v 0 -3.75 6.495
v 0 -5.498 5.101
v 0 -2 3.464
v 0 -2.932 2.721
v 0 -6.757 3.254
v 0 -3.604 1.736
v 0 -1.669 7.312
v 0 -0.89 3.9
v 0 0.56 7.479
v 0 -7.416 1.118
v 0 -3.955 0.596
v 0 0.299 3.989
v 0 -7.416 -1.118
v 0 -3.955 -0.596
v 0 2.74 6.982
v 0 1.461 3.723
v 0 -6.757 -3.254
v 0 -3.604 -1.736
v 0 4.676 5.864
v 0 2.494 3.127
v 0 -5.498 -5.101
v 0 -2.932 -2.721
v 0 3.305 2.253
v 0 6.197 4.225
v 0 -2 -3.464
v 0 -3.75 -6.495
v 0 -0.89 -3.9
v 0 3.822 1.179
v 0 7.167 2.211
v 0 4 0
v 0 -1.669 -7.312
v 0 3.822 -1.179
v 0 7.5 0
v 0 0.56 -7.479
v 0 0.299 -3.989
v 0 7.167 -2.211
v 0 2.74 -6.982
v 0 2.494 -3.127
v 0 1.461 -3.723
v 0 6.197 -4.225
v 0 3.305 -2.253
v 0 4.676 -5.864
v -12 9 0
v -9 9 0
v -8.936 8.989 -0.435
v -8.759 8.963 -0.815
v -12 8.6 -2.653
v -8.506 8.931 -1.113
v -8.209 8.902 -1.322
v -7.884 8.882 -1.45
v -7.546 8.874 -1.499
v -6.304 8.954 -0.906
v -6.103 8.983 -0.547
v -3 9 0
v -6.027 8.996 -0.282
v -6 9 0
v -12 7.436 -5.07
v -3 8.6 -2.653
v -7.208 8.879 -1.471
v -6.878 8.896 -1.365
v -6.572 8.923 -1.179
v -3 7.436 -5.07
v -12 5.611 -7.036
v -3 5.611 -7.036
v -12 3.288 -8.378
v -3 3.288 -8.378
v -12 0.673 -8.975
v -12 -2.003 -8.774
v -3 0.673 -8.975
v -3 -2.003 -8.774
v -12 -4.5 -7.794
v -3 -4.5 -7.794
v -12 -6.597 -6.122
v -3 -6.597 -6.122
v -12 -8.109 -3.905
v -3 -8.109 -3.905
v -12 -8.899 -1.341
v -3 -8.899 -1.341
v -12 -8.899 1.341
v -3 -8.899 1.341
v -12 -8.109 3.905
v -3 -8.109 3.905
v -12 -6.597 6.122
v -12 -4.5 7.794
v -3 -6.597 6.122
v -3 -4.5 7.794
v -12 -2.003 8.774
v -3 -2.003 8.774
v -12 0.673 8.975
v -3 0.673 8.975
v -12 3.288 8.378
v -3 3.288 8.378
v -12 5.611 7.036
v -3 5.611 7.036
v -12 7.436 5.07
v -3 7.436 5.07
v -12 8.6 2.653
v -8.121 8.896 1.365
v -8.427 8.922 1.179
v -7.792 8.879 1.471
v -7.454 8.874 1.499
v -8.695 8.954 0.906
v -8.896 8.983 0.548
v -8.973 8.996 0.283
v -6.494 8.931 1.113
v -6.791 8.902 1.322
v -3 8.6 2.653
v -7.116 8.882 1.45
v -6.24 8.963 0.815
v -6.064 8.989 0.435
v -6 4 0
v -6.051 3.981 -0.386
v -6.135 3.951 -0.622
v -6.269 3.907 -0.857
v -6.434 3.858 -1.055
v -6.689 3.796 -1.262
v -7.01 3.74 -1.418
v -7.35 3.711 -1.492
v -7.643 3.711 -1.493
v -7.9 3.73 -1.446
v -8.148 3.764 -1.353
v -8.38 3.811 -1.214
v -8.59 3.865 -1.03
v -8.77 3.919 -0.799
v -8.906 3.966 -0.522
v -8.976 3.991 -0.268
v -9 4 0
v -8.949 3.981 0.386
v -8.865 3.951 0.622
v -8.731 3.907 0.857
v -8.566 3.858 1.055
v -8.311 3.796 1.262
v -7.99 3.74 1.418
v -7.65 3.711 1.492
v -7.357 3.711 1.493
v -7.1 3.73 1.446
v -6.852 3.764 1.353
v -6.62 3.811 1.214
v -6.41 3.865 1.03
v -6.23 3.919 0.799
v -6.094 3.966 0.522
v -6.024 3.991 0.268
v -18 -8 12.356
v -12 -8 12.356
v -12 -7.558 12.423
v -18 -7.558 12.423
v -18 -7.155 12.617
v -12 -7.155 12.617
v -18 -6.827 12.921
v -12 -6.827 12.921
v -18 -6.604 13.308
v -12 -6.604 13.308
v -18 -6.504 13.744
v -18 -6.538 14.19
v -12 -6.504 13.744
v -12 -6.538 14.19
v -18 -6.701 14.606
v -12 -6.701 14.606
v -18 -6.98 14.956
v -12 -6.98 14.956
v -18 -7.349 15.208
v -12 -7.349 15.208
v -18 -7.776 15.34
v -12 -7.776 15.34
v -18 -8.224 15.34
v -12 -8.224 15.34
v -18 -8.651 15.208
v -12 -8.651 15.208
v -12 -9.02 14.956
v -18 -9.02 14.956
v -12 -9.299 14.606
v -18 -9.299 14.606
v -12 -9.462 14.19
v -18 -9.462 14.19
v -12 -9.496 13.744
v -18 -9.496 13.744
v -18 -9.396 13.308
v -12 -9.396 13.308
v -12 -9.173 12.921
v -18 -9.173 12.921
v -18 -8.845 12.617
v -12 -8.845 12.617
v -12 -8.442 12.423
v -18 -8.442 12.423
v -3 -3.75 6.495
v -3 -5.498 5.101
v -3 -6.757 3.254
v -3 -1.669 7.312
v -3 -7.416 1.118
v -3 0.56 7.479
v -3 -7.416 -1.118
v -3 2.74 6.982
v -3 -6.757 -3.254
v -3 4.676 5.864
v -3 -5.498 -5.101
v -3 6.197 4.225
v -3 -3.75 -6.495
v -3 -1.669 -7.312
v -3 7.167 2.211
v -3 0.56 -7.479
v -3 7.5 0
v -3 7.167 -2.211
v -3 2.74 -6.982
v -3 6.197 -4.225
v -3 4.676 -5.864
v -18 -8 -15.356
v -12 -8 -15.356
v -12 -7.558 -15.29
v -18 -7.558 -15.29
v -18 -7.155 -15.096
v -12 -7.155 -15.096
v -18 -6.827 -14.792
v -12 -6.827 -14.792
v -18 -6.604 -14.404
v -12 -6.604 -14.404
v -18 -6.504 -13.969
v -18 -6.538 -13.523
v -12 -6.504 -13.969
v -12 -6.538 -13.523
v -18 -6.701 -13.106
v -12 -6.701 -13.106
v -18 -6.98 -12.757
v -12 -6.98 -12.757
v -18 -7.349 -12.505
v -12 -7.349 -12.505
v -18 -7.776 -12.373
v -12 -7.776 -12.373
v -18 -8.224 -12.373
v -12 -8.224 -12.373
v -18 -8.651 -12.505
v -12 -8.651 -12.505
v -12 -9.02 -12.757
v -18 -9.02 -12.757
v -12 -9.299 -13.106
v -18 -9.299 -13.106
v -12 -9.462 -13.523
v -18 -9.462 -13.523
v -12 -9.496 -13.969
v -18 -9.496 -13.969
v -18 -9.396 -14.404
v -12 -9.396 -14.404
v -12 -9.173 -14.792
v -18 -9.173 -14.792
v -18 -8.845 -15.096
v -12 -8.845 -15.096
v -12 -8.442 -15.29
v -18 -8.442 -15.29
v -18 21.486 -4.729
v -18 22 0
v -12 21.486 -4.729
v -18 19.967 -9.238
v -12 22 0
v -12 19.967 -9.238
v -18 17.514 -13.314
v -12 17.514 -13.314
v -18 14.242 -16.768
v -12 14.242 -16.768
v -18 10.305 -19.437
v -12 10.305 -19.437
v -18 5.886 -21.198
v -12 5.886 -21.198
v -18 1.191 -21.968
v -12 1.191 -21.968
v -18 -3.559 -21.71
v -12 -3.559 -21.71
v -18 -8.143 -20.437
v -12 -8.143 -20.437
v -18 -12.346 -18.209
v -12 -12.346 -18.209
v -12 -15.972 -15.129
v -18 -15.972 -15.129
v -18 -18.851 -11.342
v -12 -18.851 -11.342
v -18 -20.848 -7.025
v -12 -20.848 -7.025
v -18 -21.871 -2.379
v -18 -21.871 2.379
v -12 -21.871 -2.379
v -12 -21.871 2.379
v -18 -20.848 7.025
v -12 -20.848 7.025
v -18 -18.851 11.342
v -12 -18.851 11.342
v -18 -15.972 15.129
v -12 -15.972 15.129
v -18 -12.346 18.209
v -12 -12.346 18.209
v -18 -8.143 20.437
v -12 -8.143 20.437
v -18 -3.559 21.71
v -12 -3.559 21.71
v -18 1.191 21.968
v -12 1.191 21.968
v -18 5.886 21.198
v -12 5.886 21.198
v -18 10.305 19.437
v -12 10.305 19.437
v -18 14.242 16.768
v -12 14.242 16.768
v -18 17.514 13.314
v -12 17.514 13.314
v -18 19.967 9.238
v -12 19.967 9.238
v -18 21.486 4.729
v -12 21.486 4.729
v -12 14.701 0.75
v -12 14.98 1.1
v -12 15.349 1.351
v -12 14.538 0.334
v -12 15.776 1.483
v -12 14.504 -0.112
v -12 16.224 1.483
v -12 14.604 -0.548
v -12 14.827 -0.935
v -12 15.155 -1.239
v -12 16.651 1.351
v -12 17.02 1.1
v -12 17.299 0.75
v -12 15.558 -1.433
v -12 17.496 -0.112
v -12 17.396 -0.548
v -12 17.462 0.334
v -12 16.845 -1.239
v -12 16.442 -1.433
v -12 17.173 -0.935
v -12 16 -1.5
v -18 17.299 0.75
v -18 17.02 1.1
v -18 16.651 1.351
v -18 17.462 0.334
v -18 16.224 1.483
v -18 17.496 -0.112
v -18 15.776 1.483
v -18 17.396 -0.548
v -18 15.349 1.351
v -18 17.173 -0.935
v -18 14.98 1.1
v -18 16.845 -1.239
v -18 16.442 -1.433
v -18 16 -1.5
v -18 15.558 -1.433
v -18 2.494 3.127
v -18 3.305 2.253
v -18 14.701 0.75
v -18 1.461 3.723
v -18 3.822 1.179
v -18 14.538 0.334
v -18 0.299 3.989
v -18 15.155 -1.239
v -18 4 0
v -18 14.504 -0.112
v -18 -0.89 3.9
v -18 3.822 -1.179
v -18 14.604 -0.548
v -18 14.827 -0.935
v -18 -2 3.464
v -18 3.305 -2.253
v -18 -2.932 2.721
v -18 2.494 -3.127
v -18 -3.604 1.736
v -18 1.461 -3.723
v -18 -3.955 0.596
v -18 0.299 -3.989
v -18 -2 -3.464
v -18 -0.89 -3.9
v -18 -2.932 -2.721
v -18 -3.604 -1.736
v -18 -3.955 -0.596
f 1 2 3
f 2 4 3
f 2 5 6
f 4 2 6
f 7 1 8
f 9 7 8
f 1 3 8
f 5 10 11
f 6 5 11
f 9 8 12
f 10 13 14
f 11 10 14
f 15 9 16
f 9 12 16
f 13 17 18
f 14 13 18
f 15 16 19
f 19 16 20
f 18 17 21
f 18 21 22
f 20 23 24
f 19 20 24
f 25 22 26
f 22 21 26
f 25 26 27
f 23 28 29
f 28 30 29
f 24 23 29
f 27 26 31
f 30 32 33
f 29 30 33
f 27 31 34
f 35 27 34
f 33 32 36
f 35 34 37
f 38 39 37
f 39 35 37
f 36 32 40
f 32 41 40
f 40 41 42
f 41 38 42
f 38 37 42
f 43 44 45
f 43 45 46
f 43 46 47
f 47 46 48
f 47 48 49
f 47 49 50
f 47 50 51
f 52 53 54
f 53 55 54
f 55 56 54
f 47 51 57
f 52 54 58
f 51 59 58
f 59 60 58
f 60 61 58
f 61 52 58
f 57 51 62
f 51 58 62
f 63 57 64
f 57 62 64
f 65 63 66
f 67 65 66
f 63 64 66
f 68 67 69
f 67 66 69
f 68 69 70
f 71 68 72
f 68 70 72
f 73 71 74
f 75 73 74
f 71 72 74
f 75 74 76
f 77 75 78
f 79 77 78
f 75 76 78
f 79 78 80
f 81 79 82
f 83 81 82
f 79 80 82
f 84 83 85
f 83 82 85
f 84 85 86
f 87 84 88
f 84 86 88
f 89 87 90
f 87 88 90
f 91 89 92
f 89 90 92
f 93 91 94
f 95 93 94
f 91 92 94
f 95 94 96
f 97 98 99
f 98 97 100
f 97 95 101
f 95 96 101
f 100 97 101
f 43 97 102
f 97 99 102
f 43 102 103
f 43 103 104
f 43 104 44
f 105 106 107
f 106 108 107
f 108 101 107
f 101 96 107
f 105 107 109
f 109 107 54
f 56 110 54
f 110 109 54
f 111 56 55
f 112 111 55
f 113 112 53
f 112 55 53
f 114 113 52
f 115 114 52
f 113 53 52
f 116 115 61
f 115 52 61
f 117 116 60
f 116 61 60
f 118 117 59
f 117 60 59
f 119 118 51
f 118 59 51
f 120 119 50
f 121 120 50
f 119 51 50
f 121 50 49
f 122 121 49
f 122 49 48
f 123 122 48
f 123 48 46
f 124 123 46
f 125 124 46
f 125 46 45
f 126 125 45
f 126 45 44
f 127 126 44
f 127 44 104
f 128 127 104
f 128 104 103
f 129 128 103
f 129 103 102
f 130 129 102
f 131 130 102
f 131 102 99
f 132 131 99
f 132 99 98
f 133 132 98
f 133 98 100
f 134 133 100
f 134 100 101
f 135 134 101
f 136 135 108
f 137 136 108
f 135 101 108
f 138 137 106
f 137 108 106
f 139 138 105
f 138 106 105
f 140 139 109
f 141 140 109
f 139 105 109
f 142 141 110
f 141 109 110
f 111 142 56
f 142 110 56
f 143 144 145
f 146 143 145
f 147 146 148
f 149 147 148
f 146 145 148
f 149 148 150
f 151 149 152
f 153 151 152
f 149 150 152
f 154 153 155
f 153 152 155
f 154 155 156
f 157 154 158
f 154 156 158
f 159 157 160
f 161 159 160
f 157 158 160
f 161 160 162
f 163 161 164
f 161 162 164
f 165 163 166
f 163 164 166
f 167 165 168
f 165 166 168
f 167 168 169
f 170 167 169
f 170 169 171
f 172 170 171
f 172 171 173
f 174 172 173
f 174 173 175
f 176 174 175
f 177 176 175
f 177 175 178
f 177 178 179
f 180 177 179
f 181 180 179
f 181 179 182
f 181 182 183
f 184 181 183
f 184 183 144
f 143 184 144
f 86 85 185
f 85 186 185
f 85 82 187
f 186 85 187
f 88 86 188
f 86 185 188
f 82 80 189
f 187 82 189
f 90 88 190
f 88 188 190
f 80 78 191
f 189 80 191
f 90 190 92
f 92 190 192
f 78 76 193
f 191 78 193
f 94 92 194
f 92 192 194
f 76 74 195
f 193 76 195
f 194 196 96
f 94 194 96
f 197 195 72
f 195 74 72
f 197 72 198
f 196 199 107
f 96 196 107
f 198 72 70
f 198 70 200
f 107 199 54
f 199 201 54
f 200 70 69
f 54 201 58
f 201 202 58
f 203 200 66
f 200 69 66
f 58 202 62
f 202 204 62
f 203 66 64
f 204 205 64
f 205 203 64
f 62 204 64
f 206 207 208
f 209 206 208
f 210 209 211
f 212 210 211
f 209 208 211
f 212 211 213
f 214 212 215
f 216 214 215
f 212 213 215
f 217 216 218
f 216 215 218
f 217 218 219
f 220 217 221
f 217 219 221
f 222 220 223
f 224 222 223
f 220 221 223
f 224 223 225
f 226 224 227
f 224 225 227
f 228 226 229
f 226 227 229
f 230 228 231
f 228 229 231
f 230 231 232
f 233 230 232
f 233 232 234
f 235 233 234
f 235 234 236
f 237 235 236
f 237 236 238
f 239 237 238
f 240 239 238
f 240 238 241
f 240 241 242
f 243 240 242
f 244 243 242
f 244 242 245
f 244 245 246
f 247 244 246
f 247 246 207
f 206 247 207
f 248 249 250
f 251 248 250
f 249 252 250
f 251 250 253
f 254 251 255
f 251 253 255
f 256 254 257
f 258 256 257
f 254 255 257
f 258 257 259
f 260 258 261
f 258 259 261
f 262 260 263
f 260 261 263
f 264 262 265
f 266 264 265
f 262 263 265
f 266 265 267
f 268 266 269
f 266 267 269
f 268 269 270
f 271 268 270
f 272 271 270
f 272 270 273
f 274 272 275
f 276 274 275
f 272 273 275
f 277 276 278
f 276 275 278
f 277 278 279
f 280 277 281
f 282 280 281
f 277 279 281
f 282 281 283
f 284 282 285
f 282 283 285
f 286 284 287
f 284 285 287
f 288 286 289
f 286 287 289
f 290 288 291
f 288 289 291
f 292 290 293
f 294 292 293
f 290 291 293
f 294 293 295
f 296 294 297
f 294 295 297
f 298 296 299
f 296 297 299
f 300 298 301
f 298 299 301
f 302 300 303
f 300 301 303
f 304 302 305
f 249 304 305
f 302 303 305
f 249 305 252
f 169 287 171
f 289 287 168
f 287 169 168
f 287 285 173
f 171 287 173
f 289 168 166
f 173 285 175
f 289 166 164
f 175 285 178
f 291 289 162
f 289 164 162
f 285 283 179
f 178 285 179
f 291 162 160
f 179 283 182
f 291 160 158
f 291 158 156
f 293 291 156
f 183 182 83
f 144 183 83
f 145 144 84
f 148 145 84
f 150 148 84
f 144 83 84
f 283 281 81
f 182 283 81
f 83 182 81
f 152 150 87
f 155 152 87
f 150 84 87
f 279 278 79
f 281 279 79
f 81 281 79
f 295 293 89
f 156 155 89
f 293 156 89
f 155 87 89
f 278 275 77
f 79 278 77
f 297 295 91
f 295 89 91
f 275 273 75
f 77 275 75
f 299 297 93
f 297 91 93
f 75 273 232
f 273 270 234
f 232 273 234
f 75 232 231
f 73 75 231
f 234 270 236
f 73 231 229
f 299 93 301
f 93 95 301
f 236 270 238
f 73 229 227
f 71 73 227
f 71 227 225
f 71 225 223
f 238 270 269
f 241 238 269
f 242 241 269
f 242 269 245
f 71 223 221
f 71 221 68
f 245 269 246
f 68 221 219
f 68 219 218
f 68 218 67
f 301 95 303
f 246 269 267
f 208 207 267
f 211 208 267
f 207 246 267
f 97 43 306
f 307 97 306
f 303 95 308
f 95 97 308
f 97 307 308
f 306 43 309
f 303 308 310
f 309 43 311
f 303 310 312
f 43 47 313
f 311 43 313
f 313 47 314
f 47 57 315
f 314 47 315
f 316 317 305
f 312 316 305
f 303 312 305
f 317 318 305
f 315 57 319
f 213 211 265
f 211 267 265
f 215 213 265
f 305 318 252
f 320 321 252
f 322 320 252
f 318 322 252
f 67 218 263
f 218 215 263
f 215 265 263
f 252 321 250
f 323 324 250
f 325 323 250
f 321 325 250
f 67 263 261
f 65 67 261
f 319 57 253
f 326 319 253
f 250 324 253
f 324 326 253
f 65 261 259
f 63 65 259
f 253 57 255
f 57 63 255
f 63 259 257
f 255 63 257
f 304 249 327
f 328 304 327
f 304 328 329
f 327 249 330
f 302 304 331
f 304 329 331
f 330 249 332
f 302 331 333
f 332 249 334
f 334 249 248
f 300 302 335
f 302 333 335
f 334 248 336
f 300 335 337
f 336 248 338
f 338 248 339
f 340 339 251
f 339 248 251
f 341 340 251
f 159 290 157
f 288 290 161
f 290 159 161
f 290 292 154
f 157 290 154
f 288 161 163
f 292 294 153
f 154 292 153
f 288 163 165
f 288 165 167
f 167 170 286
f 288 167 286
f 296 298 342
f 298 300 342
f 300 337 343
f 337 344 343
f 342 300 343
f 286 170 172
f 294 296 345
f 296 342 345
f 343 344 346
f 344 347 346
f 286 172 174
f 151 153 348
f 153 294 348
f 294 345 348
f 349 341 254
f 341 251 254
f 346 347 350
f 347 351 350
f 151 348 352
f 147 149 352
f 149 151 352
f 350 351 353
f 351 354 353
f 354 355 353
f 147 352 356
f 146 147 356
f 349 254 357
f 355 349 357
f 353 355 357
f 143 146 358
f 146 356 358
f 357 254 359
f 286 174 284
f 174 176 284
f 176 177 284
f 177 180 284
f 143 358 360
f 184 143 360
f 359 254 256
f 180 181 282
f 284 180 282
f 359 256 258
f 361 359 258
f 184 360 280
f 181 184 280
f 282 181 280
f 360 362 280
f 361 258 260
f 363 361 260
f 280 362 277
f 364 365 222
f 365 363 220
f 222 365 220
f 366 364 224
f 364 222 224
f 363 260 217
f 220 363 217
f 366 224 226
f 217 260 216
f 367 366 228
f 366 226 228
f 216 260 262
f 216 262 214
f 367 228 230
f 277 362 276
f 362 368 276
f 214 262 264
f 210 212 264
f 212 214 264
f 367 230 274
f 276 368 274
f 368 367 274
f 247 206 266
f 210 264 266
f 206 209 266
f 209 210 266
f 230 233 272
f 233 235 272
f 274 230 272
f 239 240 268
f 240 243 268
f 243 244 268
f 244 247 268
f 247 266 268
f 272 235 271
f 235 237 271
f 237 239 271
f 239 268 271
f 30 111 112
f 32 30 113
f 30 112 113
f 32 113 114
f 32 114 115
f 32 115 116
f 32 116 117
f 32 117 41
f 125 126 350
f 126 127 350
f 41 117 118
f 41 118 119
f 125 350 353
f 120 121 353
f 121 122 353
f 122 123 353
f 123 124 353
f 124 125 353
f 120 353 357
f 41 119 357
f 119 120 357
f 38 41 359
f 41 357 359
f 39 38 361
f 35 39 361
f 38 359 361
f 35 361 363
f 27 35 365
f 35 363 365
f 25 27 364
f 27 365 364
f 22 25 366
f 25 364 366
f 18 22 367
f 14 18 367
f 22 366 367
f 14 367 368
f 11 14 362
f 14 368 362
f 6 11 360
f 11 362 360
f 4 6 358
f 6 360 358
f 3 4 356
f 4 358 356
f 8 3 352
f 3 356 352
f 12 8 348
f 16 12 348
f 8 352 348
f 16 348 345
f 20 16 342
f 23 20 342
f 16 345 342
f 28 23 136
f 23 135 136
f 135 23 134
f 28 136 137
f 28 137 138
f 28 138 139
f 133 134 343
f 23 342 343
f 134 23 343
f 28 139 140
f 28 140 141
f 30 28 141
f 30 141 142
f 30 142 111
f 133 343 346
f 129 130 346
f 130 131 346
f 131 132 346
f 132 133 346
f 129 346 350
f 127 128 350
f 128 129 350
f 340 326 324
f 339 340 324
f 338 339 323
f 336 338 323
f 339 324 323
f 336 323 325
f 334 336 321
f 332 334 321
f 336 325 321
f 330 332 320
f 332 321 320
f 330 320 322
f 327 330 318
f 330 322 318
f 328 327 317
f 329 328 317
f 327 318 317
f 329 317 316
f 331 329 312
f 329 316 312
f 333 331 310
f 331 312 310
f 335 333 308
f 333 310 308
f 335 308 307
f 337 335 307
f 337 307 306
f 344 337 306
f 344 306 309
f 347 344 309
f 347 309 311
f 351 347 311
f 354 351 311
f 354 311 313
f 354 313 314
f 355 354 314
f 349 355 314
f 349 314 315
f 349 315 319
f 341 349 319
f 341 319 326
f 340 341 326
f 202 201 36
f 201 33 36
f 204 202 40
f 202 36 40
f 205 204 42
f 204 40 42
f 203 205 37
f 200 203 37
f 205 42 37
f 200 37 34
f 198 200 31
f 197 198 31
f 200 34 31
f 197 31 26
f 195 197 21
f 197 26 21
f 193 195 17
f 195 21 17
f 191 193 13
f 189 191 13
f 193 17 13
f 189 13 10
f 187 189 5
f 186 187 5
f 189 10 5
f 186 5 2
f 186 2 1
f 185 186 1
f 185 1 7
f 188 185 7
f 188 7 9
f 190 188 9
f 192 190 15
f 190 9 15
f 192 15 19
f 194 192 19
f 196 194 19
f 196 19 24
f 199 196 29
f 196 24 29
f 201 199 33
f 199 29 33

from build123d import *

# Parameters (mm, degrees)
ESQUISSE2_R             = 1.5
ENL_V_MAT_EXTRU_1_DEPTH = 7
ENL_V_MAT_EXTRU_2_REACH = 33
ESQUISSE3_R             = 1.5


with BuildPart() as part:
    # Esquisse1 → Révolution1 (revolve)
    with BuildSketch(Plane.XY):
        Polygon((0, 4), (-18, 4), (-18, 22), (-12, 22), (-12, 9), (-3, 9), (-3, 7.5), (0, 7.5), align=None)
    revolve(axis=Axis((0, 0, 0), (-1, 0, 0)))

    # Esquisse2 → Enlèv. mat.-Extru.1 (cut, through all)
    with BuildSketch(Plane(origin=(-12, 0, 0), x_dir=(0, 0, -1), z_dir=(1, 0, 0))):
        with Locations((0, 16)):
            Circle(ESQUISSE2_R)
        with Locations((13.856406461, -8)):
            Circle(ESQUISSE2_R)
        with Locations((-13.856406461, -8)):
            Circle(ESQUISSE2_R)
    extrude(amount=-ENL_V_MAT_EXTRU_1_DEPTH, mode=Mode.SUBTRACT)

    # Esquisse3 → Enlèv. mat.-Extru.2 (cut, up to next)
    with BuildSketch(Plane(origin=(0, 9, 0), x_dir=(1, 0, 0), z_dir=(0, 1, 0)), mode=Mode.PRIVATE) as enl_v_mat_extru_2_sk1:
        with Locations((-7.5, 0)):
            Circle(ESQUISSE3_R)
    enl_v_mat_extru_2_tool1 = extrude(enl_v_mat_extru_2_sk1.sketch, amount=-ENL_V_MAT_EXTRU_2_REACH, mode=Mode.PRIVATE) & part.part
    add(enl_v_mat_extru_2_tool1.solids().sort_by_distance((-7.5, 9, 0))[0], mode=Mode.SUBTRACT)


solid = part.part
